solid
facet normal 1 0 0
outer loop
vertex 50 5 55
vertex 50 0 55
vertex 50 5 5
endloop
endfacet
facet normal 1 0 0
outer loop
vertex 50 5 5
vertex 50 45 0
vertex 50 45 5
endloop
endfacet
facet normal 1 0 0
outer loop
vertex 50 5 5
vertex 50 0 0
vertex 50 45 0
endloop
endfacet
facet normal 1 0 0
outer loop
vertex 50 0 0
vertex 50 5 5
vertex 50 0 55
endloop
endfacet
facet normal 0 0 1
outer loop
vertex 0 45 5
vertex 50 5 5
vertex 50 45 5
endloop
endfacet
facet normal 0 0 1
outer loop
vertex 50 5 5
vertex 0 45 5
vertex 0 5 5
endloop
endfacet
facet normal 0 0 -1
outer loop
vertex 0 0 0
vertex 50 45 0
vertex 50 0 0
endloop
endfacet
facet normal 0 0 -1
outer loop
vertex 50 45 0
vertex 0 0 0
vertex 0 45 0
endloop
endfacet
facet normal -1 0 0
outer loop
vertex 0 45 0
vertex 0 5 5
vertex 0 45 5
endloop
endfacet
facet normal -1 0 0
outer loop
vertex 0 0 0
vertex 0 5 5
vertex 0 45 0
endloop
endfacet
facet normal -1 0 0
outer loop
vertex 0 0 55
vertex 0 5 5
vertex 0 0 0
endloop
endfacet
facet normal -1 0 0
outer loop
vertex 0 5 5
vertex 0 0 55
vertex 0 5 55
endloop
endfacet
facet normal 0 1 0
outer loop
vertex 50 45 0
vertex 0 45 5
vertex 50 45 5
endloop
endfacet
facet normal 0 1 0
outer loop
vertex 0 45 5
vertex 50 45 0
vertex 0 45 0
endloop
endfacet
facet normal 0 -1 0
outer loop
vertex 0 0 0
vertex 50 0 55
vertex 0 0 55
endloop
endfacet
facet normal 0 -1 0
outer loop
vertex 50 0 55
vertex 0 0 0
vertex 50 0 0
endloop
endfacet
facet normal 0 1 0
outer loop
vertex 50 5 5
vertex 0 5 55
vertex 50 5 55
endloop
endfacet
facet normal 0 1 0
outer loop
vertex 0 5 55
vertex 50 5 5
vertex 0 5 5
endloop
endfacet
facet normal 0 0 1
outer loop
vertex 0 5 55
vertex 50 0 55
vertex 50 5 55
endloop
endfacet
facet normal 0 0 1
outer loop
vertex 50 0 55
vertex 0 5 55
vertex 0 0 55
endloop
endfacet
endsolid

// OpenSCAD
// Dimensions for the L-shaped mounting bracket

// Base Plate Dimensions
base_plate_x_max = 25; // Max X extent of the base plate
base_plate_x_min = -25; // Min X extent of the base plate
base_plate_y_max = 45; // Max Y extent of the base plate
base_plate_y_min = 0;  // Min Y extent of the base plate
base_plate_z_max = 5;  // Max Z height of the base plate
base_plate_thickness = 5; // Thickness of the base plate (Z dimension)

// Through-hole dimensions for Base Plate
hole1_x = -17;
hole1_y = 30;
hole2_x = 17;
hole2_y = 30;
hole_diameter = 4.5; // Diameter of the M4 holes

// Vertical Motor Plate Dimensions
motor_plate_x_max = 25; // Max X extent of the motor plate
motor_plate_x_min = -25; // Min X extent of the motor plate
motor_plate_y_max = 5;  // Max Y extent of the motor plate
motor_plate_y_min = 0;  // Min Y extent of the motor plate
motor_plate_z_max = 50; // Max Z height of the motor plate
motor_plate_thickness = 5; // Thickness of the motor plate (assuming same thickness for simplicity, though not explicitly stated)

// Motor Centring Boss Hole Dimensions
boss_hole_x = 0;
boss_hole_z = 28;
boss_hole_diameter = 23;

// M3 Screw Pattern Dimensions
screw_pattern_size = 31; // Size of the square pattern for screws
screw_spacing = 3.4; // Distance between screw centers (implied by a 31mm square)
screw_radius = screw_pattern_size / 2;

// Gusset Dimensions
gusset_thickness = 5; // Thickness of the triangular gussets
gusset_leg_length = 20; // Length of the legs along +Y and +Z

// --- Base Plate Construction ---
module base_plate() {
    cube([base_plate_x_max - base_plate_x_min, base_plate_y_max - base_plate_y_min, base_plate_thickness]);
}

// Create the main body of the base plate
difference() {
    base_plate();
    
    // Vertical through-holes (M4)
    translate([hole1_x, hole1_y, 0])
        cylinder(r = hole_diameter / 2, h = base_plate_z_max + 1, $fn=64);
    
    translate([hole2_x, hole2_y, 0])
        cylinder(r = hole_diameter / 2, h = base_plate_z_max + 1, $fn=64);
}

// --- Vertical Motor Plate Construction ---
module motor_plate() {
    cube([motor_plate_x_max - motor_plate_x_min, motor_plate_y_max - motor_plate_y_min, motor_plate_z_max]);
}

// Create the main body of the motor plate
difference() {
    motor_plate();
    
    // Cut the 23mm centering boss hole (along Y axis)
    translate([boss_hole_x, 0, boss_hole_z - 0.1]) // Slightly below Z=28 to ensure cut goes through
        cylinder(r = boss_hole_diameter / 2, h = motor_plate_z_max + 1, $fn=64);

    // Cut the four M3 screw holes (3.4mm diameter) on a 31mm square pattern centered at (0, 28)
    for (i = [0 : 2]) {
        for (j = [0 : 2]) {
            screw_x = -screw_radius + i * screw_spacing;
            screw_y = 28 - screw_radius + j * screw_spacing;
            
            translate([screw_x, screw_y, 0])
                cylinder(r = 3.4 / 2, h = motor_plate_z_max + 1, $fn=64);
        }
    }
}

// --- Triangular Gussets Construction ---
module gusset_left() {
    // Right triangle in the YZ plane, right angle at (y=5, z=5)
    // Legs: 20mm along +Y and 20mm along +Z
    
    // Define vertices for the triangle based on the description:
    // Corner 1 (Right Angle): (y=5, z=5)
    // Corner 2 (Along Y axis): (y = 5 + 20, z = 5) => (y=25, z=5)
    // Corner 3 (Along Z axis): (y = 5, z = 5 + 20) => (y=5, z=25)

    polygon(points = [
        [5, 5],      // Right angle corner
        [25, 5],     // End of Y leg
        [5, 25]      // End of Z leg
    ]);
}

module gusset_right() {
    // Right triangle in the YZ plane, right angle at (y=5, z=5)
    // Legs: 20mm along +Y and 20mm along +Z
    
    // Define vertices for the triangle based on the description:
    // Corner 1 (Right Angle): (y=5, z=5)
    // Corner 2 (Along Y axis): (y = 5 - 20, z = 5) => (y=-15, z=5) -- Wait, this seems wrong based on the description "flush with the right edge (x=20 to 25)"
    
    // Reinterpreting: The gusset is attached to the right side of the bracket.
    // If it's flush with x=25, and its corner is at y=5, z=5.
    // Let's assume the triangle extends *outward* from the main body along the X axis boundary.
    
    // Based on: "each is a right triangle in the YZ plane with legs 20 mm along +Y and 20 mm along +Z, its right-angle corner at y = 5, z = 5 (where the plates meet)."
    
    // If it's on the right side (x=25), the triangle should extend towards positive X.
    // Let's define the triangle in the YZ plane relative to the origin of the plate structure.
    
    // Assuming the gusset is centered around x=22.5 for simplicity, or just defined by its corners:
    
    polygon(points = [
        [5, 5],      // Right angle corner (at y=5, z=5)
        [25, 5],     // Point along +Y leg (y=5+20=25, z=5)
        [5, 25]      // Point along +Z leg (y=5, z=5+20=25)
    ]);
}


// --- Assembly ---

// 1. Base Plate
base_plate();

// 2. Motor Plate (Positioned on the back edge of the base plate)
// The motor plate spans X=[-25, 25], Y=[0, 5]. It sits on the back edge of the base plate (Y=45).
// Since the description says "standing on the back edge of the base", we place it such that its bottom edge aligns with the top edge of the base plate's Z=5.
// However, the motor plate is defined from Y=0 to Y=5. Let's assume it sits adjacent to the base plate structure.

translate([0, 0, base_plate_thickness]) // Lift motor plate up by base plate thickness (Z=5)
    motor_plate();


// 3. Gussets (These are attached to the sides of the overall structure)
// Left Gusset (Attached near x=-25)
translate([-25, 0, 0]) // Position origin at the left edge of the base plate
    rotate([90, 0, 0]) // Rotate so YZ plane is aligned with the triangle definition
    gusset_left();

// Right Gusset (Attached near x=25)
translate([25, 0, 0]) // Position origin at the right edge of the base plate
    rotate([90, 0, 0]) // Rotate so YZ plane is aligned with the triangle definition
    gusset_right();

// Note on assembly: The description implies an L-shape where the motor plate sits on the back
